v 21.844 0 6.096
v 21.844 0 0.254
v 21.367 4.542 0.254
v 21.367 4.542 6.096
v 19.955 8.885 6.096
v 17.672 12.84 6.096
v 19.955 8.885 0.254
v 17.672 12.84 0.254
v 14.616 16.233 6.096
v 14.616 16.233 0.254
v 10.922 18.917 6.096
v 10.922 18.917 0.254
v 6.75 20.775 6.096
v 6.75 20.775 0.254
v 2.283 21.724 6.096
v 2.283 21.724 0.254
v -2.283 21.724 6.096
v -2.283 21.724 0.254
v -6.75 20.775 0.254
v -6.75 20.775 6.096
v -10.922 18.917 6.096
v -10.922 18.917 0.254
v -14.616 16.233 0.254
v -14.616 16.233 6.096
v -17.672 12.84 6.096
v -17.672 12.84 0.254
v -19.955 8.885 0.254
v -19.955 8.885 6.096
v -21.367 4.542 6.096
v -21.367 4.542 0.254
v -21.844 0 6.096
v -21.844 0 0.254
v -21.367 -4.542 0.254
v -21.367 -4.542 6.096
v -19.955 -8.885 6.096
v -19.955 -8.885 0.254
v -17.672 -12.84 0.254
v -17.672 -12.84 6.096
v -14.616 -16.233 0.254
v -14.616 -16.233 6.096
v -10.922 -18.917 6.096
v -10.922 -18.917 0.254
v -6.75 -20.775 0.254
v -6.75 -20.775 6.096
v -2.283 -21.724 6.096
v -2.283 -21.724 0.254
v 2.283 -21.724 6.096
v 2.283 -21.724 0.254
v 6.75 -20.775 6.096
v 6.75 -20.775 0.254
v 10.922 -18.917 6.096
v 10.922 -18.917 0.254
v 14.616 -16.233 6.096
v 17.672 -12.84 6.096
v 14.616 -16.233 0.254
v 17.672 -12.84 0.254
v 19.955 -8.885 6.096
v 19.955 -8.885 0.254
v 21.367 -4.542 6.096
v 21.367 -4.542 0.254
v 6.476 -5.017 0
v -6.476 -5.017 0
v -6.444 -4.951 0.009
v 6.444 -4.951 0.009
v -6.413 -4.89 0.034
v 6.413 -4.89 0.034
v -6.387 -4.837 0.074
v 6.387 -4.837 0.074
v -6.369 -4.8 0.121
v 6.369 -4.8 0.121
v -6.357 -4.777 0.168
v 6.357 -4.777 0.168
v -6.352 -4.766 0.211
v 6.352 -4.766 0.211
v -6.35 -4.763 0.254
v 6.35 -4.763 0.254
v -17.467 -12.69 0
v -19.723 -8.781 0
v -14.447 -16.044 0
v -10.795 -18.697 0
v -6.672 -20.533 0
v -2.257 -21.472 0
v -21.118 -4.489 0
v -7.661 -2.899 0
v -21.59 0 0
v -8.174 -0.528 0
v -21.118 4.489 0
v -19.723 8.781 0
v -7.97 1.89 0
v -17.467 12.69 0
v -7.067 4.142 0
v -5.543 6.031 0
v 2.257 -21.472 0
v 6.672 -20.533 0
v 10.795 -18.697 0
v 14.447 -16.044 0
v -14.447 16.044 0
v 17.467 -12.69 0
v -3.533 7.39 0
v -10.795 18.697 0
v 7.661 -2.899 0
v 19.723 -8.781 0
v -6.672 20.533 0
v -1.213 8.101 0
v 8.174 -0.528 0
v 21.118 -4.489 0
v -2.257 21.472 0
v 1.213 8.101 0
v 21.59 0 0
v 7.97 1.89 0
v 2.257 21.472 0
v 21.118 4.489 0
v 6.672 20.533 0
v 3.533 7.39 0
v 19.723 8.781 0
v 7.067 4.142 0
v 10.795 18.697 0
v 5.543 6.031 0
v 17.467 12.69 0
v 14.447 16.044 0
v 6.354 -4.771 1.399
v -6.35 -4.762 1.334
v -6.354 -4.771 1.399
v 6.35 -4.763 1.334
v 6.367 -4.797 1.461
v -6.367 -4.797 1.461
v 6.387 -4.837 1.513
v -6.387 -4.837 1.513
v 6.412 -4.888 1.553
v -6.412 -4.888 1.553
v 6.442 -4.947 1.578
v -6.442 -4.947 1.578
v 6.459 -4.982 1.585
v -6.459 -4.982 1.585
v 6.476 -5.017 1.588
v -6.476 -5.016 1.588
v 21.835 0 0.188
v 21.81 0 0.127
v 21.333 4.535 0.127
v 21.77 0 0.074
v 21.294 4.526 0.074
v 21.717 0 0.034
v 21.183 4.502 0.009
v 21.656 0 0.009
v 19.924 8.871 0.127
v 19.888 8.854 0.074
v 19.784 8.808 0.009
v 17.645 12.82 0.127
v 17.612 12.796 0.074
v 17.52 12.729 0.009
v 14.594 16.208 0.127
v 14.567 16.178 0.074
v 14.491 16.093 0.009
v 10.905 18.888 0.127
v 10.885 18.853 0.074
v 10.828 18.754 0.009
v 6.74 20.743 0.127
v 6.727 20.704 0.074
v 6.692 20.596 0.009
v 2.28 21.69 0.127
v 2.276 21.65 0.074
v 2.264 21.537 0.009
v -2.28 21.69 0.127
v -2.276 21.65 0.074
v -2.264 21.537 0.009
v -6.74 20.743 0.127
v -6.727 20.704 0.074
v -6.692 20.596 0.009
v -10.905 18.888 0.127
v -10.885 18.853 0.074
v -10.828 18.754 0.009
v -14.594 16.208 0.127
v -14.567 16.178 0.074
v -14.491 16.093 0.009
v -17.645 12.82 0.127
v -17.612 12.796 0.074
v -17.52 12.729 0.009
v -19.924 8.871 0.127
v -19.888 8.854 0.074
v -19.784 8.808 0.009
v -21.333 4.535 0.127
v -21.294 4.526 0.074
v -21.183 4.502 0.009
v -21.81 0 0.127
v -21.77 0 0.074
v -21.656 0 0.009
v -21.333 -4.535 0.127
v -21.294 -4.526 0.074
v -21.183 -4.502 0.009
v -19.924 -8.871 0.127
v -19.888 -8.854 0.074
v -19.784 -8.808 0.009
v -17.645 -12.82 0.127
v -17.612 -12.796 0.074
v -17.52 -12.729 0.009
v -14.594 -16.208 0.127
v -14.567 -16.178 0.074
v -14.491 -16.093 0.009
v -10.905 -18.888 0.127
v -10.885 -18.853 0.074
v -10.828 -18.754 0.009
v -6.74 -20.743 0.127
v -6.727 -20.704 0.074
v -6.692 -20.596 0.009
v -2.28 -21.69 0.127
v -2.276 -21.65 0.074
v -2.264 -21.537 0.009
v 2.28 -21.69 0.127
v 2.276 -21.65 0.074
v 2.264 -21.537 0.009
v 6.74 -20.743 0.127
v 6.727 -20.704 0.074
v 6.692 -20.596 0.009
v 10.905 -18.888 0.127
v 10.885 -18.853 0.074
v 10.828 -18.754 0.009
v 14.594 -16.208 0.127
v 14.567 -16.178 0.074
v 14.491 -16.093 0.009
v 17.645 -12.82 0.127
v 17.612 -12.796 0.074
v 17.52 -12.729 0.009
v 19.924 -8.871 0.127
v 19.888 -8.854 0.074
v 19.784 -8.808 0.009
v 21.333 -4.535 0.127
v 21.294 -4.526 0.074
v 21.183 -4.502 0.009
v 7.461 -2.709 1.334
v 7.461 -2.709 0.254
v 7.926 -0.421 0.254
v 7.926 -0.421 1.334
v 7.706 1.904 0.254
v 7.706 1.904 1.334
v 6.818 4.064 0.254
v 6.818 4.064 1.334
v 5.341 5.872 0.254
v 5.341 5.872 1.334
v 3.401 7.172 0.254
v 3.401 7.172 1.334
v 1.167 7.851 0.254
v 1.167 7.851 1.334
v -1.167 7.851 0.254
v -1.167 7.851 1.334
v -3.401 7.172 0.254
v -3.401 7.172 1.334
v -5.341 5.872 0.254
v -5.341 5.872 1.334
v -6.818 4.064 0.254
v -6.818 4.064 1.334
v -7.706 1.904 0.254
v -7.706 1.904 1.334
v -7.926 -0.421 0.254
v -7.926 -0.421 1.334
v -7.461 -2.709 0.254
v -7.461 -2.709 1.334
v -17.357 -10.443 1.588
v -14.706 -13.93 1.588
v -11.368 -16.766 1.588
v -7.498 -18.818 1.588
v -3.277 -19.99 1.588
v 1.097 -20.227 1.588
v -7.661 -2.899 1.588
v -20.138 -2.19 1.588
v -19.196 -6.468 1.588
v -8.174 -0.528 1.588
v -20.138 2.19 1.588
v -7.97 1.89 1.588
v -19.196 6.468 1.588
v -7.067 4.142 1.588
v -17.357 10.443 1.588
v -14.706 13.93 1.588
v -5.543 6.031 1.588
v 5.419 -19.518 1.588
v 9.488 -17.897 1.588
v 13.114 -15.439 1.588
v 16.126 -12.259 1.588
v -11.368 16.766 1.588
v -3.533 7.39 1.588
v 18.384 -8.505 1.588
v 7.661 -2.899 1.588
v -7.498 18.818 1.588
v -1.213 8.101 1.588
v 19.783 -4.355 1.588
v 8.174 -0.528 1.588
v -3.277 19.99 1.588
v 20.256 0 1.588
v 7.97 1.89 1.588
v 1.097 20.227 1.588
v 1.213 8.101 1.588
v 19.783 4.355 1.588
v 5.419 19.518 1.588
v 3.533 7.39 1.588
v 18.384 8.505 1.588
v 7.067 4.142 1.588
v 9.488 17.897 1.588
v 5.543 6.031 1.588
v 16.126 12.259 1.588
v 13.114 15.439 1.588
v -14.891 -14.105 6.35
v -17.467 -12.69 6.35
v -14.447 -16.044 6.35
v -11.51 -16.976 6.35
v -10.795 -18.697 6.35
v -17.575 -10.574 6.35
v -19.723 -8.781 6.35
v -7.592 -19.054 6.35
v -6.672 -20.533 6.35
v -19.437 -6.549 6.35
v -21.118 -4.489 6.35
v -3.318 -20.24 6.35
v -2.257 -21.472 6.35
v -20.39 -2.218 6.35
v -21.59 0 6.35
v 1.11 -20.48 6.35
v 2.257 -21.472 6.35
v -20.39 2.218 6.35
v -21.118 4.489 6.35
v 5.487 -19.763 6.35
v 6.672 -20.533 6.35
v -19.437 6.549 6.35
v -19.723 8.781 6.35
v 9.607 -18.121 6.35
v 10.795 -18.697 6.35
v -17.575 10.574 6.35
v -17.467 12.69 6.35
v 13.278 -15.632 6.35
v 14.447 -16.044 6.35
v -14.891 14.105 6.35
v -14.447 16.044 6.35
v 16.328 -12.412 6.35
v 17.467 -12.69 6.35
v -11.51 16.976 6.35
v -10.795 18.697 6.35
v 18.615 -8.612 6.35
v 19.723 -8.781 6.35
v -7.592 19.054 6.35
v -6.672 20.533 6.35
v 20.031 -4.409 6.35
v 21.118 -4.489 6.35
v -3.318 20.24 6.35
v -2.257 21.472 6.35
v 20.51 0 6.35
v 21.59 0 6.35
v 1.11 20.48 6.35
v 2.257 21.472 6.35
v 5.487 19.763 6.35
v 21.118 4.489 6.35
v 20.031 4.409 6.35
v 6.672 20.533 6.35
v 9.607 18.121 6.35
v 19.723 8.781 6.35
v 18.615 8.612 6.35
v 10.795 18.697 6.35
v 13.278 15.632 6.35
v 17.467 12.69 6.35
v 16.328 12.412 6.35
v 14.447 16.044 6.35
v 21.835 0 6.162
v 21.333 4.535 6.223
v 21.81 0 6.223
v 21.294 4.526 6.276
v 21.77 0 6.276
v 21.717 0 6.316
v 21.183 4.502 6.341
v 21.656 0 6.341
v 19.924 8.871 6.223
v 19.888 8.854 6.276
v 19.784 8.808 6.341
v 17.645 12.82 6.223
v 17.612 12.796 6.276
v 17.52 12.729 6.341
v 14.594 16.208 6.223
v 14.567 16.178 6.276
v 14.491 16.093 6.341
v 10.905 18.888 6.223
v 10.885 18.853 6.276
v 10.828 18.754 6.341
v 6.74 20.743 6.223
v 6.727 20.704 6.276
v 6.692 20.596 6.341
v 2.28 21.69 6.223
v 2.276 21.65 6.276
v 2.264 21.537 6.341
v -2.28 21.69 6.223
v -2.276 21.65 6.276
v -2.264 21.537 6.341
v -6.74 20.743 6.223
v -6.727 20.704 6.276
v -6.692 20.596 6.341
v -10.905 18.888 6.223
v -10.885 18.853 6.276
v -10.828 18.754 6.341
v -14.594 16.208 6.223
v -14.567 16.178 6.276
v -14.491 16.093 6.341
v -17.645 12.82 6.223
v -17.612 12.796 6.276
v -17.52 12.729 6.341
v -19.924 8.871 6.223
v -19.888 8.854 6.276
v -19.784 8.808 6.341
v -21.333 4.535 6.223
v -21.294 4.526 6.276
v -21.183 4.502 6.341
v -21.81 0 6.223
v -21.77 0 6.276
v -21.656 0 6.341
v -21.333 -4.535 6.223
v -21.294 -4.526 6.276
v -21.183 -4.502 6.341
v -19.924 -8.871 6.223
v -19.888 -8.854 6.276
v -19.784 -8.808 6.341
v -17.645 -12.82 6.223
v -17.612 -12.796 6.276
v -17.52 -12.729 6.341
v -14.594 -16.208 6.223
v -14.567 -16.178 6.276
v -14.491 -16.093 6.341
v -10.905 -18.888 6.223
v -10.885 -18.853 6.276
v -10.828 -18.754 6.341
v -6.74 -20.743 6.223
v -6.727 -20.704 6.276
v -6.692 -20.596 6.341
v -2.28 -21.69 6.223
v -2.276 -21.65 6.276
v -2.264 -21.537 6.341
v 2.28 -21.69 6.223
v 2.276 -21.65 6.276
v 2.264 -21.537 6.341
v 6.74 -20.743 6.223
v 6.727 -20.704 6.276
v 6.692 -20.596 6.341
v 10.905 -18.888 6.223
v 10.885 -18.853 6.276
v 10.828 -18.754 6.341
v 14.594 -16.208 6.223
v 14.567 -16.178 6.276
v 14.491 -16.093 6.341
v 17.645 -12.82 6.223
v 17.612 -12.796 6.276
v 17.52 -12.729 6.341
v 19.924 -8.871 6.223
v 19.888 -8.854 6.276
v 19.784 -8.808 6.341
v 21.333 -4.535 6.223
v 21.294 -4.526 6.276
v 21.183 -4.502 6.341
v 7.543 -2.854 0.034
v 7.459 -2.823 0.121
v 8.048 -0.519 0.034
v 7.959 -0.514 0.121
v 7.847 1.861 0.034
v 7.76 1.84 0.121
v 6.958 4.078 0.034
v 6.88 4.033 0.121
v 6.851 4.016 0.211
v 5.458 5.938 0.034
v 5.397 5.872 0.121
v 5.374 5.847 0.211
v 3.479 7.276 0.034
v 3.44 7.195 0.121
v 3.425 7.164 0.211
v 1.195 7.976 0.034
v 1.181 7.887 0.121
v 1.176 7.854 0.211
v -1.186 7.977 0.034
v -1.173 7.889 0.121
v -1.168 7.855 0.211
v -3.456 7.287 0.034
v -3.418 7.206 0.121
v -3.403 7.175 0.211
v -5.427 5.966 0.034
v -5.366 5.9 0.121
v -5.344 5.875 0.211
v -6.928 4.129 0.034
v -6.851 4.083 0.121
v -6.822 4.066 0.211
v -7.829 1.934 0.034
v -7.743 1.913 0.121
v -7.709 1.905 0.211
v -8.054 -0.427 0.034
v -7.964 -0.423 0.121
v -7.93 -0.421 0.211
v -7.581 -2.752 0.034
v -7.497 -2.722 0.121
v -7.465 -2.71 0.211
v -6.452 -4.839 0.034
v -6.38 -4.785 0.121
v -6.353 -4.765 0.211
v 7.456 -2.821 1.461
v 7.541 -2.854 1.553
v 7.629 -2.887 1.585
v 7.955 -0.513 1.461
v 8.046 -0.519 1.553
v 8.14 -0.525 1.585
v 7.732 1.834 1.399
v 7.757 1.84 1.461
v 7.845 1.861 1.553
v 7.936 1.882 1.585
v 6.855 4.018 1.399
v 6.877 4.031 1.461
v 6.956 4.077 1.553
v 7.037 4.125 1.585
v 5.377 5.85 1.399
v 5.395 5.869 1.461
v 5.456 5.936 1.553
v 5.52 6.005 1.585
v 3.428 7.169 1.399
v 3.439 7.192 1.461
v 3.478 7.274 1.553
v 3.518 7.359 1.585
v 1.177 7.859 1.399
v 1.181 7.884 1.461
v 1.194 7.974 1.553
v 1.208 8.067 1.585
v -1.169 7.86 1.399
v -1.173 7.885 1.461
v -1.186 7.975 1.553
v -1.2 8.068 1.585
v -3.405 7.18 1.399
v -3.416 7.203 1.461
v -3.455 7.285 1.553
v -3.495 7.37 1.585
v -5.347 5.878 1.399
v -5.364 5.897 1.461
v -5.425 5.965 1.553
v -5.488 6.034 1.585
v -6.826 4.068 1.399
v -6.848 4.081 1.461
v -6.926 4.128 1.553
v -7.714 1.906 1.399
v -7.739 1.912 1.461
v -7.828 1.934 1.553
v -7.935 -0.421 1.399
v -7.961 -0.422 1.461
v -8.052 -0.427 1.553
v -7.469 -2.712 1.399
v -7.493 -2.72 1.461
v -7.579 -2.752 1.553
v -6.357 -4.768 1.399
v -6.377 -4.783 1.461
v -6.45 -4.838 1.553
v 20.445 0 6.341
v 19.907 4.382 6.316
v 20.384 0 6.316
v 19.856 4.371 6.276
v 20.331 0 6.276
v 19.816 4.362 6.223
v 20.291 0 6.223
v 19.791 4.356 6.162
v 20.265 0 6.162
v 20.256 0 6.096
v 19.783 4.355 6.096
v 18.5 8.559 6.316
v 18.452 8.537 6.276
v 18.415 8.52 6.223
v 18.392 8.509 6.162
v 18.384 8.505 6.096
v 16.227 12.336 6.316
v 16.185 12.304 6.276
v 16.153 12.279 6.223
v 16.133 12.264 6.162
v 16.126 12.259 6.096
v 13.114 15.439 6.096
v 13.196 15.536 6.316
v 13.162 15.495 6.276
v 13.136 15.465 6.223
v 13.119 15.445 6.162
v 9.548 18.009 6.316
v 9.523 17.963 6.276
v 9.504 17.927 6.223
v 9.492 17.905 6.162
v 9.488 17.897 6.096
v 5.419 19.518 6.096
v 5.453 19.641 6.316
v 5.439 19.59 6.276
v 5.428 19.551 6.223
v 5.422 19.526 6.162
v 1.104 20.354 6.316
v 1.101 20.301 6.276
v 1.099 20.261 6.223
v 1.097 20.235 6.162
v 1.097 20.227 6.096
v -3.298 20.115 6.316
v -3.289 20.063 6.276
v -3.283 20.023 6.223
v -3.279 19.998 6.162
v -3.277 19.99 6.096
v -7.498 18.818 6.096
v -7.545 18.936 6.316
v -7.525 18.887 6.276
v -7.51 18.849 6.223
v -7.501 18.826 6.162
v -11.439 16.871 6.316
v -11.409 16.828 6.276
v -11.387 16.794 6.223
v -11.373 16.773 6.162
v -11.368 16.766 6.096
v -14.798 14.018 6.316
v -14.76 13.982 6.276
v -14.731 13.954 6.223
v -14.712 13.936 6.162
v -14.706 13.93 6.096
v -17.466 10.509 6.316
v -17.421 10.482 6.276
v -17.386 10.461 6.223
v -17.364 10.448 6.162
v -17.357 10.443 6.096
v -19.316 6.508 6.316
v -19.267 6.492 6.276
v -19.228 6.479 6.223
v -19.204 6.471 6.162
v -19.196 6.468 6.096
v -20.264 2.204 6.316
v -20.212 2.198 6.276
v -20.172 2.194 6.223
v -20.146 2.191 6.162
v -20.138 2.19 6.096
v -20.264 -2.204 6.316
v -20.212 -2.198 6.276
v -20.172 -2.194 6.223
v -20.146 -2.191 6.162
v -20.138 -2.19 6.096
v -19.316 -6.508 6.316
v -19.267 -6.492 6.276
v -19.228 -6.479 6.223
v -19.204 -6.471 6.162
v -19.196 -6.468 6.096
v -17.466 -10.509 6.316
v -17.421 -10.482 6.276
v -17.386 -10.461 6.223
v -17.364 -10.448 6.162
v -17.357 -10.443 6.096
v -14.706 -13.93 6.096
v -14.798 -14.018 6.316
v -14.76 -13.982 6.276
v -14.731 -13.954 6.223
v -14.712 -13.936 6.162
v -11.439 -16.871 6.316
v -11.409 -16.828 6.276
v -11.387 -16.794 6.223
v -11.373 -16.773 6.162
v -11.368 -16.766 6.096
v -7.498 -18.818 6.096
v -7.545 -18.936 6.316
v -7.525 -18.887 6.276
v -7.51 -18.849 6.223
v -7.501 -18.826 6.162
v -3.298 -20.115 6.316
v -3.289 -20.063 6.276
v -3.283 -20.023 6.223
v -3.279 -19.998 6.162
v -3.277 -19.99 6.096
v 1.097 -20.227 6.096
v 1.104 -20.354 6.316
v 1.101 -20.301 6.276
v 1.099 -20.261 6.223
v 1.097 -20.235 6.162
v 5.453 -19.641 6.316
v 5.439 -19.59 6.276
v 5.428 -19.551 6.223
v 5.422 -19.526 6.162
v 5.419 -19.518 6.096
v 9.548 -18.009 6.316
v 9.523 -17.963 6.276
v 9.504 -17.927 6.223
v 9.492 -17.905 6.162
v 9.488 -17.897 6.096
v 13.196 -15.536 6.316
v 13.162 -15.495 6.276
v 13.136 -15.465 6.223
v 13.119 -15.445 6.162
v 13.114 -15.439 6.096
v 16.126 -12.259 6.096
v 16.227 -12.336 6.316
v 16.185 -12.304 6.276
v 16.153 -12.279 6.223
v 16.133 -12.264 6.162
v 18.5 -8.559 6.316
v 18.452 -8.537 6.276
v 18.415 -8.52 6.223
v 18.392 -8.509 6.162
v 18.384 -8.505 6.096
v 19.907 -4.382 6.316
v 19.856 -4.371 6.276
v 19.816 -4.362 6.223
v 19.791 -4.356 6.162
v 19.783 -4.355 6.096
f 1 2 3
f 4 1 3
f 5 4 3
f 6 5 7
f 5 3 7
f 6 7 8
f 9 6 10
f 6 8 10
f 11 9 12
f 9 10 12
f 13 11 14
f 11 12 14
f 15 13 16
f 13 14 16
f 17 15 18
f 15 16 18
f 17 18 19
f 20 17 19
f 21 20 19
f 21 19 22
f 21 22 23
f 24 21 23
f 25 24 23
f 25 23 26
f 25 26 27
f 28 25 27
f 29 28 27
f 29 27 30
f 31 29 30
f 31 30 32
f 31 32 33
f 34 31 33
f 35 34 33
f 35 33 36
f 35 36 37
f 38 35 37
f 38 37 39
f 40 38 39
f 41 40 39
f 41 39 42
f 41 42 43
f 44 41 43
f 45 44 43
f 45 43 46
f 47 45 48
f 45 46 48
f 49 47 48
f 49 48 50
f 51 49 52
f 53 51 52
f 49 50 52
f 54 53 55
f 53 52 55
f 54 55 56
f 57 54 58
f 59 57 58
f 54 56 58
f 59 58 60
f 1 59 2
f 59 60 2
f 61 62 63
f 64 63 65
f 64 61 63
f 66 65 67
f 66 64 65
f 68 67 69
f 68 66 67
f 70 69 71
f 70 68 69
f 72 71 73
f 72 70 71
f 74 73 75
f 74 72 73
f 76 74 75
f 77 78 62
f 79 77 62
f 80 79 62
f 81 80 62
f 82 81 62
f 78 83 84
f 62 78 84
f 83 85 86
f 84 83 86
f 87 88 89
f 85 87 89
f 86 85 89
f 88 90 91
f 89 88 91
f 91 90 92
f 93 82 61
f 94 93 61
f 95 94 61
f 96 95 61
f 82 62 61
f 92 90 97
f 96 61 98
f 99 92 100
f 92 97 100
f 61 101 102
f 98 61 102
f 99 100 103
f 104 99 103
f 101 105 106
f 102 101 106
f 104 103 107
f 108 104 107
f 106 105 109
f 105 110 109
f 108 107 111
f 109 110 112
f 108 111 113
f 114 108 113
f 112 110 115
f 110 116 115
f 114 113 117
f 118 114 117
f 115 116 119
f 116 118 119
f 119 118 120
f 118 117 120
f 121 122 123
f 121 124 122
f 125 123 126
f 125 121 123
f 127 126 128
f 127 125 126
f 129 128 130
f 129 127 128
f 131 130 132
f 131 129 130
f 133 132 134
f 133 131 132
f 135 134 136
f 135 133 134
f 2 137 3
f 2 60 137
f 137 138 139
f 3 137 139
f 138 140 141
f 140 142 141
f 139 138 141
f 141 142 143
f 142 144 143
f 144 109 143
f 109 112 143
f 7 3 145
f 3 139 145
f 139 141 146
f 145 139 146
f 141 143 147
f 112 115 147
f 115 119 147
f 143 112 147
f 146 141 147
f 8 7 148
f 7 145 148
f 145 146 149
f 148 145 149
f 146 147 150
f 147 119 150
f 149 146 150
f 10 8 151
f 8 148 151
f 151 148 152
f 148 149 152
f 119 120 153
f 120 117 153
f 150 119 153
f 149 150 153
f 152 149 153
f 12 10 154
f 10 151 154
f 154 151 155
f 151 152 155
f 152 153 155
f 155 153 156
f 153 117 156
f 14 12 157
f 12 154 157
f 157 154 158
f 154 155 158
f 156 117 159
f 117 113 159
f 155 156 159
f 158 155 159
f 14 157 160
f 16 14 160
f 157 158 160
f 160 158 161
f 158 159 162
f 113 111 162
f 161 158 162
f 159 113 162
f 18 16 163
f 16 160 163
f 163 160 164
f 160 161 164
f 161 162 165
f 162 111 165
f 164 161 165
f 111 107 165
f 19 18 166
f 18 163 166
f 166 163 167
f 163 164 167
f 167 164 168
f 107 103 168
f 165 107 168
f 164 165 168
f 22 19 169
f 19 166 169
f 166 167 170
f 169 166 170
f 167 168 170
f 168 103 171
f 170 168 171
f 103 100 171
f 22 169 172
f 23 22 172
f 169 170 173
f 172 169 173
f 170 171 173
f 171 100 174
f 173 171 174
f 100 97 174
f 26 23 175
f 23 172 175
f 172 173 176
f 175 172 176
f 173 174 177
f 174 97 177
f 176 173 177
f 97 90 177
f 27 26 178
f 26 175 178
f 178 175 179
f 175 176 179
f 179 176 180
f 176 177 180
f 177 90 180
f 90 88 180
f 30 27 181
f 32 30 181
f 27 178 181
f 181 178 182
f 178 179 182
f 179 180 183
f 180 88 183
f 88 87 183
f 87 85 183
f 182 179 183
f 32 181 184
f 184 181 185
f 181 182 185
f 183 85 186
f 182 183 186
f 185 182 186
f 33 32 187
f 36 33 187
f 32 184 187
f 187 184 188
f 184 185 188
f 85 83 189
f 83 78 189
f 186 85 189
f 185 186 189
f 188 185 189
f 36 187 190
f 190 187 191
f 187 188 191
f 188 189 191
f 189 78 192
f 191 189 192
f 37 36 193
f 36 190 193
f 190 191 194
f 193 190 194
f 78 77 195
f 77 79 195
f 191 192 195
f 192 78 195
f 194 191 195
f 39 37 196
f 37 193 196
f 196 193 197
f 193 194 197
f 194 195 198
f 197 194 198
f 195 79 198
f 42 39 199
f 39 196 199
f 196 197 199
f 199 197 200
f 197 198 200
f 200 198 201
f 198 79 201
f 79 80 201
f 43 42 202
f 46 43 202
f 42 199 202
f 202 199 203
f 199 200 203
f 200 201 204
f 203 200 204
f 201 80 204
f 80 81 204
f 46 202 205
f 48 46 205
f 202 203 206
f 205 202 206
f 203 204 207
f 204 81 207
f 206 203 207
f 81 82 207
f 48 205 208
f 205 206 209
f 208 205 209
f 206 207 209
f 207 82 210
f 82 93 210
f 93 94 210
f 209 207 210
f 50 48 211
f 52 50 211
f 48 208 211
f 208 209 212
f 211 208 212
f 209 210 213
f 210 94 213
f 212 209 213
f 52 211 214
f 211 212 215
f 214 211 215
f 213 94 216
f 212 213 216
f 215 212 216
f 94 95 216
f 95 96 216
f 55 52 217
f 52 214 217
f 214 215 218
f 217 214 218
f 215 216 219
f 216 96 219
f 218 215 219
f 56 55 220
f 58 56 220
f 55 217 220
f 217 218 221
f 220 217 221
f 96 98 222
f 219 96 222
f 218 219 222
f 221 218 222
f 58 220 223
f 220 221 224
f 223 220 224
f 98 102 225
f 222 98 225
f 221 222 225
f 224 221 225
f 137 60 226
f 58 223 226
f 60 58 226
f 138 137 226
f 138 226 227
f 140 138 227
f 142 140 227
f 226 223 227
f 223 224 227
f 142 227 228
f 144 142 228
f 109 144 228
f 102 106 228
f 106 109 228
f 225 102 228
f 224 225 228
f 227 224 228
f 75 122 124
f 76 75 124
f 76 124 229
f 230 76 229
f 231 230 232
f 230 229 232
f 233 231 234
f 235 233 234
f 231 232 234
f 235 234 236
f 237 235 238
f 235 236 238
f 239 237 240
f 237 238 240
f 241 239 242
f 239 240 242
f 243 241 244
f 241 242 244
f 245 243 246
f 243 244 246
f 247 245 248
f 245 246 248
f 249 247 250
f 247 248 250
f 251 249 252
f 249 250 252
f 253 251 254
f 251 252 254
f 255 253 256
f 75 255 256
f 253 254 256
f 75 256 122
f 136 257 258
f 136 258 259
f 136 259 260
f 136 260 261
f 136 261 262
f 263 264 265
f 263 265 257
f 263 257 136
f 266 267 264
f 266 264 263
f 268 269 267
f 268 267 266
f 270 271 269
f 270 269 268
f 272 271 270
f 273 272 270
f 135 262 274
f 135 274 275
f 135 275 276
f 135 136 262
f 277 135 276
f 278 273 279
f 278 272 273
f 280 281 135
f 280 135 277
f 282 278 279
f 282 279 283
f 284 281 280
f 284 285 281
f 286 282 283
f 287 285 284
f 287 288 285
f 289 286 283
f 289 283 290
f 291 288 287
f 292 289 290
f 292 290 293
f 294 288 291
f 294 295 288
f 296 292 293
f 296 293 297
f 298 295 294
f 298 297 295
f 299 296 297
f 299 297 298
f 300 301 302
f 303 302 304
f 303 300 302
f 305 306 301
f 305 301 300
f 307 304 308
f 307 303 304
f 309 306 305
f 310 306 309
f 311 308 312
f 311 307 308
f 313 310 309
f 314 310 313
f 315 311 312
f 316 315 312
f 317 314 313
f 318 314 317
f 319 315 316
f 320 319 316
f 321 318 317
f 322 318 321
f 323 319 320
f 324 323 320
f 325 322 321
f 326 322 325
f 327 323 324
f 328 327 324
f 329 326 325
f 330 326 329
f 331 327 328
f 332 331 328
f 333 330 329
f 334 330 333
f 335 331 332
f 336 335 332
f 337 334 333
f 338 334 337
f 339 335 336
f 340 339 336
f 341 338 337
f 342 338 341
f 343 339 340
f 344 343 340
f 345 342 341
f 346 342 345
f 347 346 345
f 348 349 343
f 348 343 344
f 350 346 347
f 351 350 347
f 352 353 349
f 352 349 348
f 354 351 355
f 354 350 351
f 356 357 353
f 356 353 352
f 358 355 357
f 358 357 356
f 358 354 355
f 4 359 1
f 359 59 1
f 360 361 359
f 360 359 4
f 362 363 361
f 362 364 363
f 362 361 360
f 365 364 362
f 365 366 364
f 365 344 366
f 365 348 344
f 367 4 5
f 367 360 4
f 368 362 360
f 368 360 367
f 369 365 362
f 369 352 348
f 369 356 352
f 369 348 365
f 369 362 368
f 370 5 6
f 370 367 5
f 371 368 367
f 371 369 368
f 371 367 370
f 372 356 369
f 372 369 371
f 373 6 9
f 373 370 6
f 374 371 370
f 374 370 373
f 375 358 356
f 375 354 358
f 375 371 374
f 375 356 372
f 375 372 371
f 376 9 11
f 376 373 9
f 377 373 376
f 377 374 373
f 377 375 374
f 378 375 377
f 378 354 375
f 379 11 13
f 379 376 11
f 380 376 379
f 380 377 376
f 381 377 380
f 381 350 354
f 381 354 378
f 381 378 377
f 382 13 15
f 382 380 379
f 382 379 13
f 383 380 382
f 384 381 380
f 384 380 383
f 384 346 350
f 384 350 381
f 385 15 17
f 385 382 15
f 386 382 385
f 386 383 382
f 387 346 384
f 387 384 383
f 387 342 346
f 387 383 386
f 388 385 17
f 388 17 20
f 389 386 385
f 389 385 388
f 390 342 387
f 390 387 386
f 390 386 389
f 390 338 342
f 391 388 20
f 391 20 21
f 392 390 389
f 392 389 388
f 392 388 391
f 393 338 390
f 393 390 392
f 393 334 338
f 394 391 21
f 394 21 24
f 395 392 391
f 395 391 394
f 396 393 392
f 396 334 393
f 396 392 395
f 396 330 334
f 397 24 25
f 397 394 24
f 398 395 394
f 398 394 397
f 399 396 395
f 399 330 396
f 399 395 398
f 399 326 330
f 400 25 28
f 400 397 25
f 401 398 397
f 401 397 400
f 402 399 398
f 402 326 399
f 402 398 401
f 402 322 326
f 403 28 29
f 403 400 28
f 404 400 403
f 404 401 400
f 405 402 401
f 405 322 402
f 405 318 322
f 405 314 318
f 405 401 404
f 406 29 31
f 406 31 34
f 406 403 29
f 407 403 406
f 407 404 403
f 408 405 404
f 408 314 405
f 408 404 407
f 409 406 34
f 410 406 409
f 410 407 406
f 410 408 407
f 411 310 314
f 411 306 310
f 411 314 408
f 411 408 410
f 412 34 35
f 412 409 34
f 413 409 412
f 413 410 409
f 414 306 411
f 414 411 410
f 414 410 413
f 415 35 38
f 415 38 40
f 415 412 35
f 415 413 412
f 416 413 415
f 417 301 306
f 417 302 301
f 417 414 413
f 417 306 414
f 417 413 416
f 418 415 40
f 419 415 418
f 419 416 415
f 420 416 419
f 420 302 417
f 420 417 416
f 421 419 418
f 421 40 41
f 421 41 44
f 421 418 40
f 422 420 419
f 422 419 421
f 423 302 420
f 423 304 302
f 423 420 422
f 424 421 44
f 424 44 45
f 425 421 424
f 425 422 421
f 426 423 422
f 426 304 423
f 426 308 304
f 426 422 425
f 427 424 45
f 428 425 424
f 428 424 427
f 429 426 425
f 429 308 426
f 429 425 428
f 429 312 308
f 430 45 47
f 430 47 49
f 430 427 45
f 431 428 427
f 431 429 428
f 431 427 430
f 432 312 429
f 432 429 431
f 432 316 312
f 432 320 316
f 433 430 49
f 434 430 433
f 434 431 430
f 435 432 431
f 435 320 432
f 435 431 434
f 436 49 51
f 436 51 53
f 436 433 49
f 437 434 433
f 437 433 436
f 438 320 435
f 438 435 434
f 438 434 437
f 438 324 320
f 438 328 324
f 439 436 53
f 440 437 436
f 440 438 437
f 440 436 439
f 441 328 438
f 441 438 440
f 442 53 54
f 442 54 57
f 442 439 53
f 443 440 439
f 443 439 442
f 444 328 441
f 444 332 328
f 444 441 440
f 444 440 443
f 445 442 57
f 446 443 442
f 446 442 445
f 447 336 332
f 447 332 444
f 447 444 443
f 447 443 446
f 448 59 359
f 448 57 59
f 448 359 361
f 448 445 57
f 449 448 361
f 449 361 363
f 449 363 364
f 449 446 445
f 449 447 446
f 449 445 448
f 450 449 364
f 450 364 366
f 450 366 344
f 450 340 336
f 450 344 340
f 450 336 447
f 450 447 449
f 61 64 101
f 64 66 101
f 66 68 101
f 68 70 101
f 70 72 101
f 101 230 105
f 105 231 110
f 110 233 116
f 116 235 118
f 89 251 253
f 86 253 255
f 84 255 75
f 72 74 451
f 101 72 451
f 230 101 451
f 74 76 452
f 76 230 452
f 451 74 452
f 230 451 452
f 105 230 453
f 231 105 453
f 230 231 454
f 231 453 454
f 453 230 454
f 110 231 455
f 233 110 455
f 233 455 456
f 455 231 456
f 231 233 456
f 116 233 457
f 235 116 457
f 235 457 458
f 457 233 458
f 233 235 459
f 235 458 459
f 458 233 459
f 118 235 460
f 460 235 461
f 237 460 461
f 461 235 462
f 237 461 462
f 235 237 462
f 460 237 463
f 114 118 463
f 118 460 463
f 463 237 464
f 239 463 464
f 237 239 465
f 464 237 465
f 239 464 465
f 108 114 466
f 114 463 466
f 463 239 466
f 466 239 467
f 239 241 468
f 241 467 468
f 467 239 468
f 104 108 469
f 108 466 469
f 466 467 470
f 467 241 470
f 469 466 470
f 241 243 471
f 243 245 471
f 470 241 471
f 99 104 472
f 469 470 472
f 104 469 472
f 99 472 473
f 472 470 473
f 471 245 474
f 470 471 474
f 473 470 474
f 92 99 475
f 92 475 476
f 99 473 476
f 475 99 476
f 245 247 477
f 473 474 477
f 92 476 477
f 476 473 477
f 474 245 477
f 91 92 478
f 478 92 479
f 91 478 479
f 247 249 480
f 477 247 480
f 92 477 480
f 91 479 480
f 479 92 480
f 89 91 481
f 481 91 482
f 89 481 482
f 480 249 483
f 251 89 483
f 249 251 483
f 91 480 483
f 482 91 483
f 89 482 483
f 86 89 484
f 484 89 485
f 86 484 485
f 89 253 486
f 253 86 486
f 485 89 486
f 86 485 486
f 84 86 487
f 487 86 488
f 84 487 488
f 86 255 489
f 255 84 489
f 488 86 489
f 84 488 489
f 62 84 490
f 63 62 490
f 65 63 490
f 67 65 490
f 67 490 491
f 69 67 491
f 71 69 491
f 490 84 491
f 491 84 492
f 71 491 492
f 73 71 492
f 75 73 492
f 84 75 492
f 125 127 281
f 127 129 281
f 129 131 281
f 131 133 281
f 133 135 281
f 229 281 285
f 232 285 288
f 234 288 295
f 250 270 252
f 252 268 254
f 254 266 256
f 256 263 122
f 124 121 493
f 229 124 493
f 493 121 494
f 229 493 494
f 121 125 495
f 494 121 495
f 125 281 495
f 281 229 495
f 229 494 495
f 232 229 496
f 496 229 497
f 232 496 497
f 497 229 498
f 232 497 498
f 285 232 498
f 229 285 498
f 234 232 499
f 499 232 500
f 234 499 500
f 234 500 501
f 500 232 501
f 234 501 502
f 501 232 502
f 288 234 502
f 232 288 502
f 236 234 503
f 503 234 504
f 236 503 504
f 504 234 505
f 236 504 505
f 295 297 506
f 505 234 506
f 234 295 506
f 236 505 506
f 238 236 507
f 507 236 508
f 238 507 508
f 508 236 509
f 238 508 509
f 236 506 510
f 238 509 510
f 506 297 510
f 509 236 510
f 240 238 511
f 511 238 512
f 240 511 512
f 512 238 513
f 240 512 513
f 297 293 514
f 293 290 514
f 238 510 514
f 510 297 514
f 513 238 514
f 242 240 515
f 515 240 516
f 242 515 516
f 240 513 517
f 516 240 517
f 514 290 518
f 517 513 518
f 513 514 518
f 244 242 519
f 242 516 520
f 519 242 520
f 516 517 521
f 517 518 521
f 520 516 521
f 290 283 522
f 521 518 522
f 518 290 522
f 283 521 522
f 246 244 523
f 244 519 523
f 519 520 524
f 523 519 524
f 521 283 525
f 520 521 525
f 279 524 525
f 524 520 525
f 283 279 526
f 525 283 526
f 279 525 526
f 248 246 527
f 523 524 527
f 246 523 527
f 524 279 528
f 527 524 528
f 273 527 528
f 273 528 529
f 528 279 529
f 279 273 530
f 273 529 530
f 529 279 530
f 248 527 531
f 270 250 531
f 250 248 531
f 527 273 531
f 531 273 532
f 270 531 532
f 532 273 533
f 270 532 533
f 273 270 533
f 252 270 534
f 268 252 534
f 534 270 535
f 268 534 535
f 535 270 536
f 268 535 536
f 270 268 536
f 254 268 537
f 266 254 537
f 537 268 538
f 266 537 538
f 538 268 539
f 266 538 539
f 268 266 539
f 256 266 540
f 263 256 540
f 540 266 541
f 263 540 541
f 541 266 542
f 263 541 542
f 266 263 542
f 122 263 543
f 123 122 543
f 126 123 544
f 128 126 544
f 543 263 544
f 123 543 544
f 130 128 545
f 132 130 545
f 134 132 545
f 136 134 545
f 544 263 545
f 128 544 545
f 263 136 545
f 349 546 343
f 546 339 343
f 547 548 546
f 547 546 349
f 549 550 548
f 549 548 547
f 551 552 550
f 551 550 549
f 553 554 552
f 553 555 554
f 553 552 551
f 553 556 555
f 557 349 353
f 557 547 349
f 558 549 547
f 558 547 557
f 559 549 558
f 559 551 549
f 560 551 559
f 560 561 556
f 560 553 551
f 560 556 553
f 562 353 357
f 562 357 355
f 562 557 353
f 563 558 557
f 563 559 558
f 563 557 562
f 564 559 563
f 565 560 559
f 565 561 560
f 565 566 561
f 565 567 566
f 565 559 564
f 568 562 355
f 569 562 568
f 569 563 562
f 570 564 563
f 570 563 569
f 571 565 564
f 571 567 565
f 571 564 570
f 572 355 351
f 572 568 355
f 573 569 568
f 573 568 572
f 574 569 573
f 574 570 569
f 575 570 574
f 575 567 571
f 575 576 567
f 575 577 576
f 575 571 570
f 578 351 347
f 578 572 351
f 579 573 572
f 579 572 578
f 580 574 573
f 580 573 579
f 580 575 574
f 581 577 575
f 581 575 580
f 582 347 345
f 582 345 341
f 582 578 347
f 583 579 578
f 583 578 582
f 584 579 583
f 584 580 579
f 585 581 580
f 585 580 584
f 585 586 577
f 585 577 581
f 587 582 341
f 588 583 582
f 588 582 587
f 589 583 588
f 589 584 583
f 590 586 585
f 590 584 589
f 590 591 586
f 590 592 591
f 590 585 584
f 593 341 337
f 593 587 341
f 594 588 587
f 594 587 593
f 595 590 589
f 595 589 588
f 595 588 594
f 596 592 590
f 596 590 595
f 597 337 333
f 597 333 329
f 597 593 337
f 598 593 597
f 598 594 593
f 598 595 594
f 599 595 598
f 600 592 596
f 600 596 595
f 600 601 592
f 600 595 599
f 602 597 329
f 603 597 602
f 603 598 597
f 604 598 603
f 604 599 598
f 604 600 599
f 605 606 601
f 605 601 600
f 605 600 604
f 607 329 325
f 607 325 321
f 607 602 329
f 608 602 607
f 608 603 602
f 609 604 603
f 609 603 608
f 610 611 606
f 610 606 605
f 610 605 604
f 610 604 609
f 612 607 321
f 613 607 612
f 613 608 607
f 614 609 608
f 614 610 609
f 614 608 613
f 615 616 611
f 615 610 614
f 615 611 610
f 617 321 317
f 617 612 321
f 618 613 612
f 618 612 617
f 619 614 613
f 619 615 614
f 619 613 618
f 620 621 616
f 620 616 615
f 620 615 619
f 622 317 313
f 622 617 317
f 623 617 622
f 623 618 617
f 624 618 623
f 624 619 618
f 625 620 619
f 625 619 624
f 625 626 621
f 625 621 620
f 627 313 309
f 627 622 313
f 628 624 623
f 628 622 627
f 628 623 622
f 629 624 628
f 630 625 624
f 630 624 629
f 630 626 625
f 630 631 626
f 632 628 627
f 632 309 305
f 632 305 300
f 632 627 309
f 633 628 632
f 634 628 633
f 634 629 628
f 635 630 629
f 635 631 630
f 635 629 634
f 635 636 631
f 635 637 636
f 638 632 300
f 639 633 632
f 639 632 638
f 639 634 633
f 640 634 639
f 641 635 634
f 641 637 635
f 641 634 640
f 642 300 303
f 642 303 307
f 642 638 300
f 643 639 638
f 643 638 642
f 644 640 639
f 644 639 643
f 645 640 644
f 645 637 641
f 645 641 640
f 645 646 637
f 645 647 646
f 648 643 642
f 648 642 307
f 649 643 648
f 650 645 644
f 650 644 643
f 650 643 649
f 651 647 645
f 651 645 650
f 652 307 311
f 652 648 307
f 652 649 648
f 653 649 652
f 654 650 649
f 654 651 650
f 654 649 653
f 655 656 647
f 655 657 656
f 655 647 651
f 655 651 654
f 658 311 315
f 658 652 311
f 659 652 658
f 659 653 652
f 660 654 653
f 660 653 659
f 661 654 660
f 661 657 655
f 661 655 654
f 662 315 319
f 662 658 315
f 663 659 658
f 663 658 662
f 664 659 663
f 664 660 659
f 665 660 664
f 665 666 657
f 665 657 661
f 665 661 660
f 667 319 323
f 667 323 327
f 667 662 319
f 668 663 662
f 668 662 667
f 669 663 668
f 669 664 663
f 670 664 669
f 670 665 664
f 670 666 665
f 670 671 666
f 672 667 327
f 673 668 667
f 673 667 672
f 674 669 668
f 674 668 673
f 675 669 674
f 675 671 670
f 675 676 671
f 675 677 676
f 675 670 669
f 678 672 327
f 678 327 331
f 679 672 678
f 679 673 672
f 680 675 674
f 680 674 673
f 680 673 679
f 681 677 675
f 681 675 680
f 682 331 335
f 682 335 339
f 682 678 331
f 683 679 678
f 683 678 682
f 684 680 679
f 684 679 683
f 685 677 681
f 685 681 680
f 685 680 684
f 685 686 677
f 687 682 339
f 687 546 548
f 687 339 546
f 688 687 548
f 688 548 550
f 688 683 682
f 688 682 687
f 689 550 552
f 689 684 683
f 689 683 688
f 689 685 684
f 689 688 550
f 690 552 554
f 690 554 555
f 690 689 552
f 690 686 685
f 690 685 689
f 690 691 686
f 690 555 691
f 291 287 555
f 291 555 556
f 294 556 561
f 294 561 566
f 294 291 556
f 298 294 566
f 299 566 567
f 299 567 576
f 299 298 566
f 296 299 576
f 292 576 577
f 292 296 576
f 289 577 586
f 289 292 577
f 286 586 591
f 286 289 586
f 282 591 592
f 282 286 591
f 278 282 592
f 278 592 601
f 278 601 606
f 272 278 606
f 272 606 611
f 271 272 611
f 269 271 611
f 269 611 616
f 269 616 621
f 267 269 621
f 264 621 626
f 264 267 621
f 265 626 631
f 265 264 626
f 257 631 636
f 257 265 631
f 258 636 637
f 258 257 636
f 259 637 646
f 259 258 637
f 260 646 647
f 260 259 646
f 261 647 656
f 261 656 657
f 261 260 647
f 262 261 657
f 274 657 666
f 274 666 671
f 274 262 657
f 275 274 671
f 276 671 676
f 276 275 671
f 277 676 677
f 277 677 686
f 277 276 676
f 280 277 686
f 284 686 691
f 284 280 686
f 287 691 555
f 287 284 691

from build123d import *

# Parameters (mm, degrees)
F0_R     = 21.844
F1_DEPTH = 1.5875
F2_R     = 21.844
F2_R_2   = 20.2565
F3_DEPTH = 4.7625
F5_DEPTH = 25.4
F6_R     = 0.254


with BuildPart() as f1:
    # F0 (on Top) → F1 (new body)
    with BuildSketch(Plane.XY):
        Circle(F0_R)
    extrude(amount=F1_DEPTH)

    # F2 (on face) → F3 (join)
    with BuildSketch(Plane.XY.offset(1.5875)):
        Circle(F2_R)
        Circle(F2_R_2, mode=Mode.SUBTRACT)
    extrude(amount=F3_DEPTH)

    # F4 (on face) → F5 (cut)
    with BuildSketch(Plane.XY.offset(1.5875)):
        with BuildLine():
            Line((-6.35, -4.7625), (6.35, -4.7625))
            ThreePointArc((6.35, -4.7625), (0, 7.9375), (-6.35, -4.7625))
        make_face()
    extrude(amount=-F5_DEPTH, mode=Mode.SUBTRACT)

    # F6
    f6_edges = [f1.edges().sort_by_distance(p)[0] for p in [
        (-21.844, 0, 6.35),
        (-20.2565, 0, 6.35),
        (-21.844, 0, 0),
        (0, 7.9375, 1.5875),
        (0, -4.7625, 0),
        (0, 7.9375, 0),
        (0, -4.7625, 1.5875),
    ]]
    fillet(f6_edges, radius=F6_R)


solid = f1.part
